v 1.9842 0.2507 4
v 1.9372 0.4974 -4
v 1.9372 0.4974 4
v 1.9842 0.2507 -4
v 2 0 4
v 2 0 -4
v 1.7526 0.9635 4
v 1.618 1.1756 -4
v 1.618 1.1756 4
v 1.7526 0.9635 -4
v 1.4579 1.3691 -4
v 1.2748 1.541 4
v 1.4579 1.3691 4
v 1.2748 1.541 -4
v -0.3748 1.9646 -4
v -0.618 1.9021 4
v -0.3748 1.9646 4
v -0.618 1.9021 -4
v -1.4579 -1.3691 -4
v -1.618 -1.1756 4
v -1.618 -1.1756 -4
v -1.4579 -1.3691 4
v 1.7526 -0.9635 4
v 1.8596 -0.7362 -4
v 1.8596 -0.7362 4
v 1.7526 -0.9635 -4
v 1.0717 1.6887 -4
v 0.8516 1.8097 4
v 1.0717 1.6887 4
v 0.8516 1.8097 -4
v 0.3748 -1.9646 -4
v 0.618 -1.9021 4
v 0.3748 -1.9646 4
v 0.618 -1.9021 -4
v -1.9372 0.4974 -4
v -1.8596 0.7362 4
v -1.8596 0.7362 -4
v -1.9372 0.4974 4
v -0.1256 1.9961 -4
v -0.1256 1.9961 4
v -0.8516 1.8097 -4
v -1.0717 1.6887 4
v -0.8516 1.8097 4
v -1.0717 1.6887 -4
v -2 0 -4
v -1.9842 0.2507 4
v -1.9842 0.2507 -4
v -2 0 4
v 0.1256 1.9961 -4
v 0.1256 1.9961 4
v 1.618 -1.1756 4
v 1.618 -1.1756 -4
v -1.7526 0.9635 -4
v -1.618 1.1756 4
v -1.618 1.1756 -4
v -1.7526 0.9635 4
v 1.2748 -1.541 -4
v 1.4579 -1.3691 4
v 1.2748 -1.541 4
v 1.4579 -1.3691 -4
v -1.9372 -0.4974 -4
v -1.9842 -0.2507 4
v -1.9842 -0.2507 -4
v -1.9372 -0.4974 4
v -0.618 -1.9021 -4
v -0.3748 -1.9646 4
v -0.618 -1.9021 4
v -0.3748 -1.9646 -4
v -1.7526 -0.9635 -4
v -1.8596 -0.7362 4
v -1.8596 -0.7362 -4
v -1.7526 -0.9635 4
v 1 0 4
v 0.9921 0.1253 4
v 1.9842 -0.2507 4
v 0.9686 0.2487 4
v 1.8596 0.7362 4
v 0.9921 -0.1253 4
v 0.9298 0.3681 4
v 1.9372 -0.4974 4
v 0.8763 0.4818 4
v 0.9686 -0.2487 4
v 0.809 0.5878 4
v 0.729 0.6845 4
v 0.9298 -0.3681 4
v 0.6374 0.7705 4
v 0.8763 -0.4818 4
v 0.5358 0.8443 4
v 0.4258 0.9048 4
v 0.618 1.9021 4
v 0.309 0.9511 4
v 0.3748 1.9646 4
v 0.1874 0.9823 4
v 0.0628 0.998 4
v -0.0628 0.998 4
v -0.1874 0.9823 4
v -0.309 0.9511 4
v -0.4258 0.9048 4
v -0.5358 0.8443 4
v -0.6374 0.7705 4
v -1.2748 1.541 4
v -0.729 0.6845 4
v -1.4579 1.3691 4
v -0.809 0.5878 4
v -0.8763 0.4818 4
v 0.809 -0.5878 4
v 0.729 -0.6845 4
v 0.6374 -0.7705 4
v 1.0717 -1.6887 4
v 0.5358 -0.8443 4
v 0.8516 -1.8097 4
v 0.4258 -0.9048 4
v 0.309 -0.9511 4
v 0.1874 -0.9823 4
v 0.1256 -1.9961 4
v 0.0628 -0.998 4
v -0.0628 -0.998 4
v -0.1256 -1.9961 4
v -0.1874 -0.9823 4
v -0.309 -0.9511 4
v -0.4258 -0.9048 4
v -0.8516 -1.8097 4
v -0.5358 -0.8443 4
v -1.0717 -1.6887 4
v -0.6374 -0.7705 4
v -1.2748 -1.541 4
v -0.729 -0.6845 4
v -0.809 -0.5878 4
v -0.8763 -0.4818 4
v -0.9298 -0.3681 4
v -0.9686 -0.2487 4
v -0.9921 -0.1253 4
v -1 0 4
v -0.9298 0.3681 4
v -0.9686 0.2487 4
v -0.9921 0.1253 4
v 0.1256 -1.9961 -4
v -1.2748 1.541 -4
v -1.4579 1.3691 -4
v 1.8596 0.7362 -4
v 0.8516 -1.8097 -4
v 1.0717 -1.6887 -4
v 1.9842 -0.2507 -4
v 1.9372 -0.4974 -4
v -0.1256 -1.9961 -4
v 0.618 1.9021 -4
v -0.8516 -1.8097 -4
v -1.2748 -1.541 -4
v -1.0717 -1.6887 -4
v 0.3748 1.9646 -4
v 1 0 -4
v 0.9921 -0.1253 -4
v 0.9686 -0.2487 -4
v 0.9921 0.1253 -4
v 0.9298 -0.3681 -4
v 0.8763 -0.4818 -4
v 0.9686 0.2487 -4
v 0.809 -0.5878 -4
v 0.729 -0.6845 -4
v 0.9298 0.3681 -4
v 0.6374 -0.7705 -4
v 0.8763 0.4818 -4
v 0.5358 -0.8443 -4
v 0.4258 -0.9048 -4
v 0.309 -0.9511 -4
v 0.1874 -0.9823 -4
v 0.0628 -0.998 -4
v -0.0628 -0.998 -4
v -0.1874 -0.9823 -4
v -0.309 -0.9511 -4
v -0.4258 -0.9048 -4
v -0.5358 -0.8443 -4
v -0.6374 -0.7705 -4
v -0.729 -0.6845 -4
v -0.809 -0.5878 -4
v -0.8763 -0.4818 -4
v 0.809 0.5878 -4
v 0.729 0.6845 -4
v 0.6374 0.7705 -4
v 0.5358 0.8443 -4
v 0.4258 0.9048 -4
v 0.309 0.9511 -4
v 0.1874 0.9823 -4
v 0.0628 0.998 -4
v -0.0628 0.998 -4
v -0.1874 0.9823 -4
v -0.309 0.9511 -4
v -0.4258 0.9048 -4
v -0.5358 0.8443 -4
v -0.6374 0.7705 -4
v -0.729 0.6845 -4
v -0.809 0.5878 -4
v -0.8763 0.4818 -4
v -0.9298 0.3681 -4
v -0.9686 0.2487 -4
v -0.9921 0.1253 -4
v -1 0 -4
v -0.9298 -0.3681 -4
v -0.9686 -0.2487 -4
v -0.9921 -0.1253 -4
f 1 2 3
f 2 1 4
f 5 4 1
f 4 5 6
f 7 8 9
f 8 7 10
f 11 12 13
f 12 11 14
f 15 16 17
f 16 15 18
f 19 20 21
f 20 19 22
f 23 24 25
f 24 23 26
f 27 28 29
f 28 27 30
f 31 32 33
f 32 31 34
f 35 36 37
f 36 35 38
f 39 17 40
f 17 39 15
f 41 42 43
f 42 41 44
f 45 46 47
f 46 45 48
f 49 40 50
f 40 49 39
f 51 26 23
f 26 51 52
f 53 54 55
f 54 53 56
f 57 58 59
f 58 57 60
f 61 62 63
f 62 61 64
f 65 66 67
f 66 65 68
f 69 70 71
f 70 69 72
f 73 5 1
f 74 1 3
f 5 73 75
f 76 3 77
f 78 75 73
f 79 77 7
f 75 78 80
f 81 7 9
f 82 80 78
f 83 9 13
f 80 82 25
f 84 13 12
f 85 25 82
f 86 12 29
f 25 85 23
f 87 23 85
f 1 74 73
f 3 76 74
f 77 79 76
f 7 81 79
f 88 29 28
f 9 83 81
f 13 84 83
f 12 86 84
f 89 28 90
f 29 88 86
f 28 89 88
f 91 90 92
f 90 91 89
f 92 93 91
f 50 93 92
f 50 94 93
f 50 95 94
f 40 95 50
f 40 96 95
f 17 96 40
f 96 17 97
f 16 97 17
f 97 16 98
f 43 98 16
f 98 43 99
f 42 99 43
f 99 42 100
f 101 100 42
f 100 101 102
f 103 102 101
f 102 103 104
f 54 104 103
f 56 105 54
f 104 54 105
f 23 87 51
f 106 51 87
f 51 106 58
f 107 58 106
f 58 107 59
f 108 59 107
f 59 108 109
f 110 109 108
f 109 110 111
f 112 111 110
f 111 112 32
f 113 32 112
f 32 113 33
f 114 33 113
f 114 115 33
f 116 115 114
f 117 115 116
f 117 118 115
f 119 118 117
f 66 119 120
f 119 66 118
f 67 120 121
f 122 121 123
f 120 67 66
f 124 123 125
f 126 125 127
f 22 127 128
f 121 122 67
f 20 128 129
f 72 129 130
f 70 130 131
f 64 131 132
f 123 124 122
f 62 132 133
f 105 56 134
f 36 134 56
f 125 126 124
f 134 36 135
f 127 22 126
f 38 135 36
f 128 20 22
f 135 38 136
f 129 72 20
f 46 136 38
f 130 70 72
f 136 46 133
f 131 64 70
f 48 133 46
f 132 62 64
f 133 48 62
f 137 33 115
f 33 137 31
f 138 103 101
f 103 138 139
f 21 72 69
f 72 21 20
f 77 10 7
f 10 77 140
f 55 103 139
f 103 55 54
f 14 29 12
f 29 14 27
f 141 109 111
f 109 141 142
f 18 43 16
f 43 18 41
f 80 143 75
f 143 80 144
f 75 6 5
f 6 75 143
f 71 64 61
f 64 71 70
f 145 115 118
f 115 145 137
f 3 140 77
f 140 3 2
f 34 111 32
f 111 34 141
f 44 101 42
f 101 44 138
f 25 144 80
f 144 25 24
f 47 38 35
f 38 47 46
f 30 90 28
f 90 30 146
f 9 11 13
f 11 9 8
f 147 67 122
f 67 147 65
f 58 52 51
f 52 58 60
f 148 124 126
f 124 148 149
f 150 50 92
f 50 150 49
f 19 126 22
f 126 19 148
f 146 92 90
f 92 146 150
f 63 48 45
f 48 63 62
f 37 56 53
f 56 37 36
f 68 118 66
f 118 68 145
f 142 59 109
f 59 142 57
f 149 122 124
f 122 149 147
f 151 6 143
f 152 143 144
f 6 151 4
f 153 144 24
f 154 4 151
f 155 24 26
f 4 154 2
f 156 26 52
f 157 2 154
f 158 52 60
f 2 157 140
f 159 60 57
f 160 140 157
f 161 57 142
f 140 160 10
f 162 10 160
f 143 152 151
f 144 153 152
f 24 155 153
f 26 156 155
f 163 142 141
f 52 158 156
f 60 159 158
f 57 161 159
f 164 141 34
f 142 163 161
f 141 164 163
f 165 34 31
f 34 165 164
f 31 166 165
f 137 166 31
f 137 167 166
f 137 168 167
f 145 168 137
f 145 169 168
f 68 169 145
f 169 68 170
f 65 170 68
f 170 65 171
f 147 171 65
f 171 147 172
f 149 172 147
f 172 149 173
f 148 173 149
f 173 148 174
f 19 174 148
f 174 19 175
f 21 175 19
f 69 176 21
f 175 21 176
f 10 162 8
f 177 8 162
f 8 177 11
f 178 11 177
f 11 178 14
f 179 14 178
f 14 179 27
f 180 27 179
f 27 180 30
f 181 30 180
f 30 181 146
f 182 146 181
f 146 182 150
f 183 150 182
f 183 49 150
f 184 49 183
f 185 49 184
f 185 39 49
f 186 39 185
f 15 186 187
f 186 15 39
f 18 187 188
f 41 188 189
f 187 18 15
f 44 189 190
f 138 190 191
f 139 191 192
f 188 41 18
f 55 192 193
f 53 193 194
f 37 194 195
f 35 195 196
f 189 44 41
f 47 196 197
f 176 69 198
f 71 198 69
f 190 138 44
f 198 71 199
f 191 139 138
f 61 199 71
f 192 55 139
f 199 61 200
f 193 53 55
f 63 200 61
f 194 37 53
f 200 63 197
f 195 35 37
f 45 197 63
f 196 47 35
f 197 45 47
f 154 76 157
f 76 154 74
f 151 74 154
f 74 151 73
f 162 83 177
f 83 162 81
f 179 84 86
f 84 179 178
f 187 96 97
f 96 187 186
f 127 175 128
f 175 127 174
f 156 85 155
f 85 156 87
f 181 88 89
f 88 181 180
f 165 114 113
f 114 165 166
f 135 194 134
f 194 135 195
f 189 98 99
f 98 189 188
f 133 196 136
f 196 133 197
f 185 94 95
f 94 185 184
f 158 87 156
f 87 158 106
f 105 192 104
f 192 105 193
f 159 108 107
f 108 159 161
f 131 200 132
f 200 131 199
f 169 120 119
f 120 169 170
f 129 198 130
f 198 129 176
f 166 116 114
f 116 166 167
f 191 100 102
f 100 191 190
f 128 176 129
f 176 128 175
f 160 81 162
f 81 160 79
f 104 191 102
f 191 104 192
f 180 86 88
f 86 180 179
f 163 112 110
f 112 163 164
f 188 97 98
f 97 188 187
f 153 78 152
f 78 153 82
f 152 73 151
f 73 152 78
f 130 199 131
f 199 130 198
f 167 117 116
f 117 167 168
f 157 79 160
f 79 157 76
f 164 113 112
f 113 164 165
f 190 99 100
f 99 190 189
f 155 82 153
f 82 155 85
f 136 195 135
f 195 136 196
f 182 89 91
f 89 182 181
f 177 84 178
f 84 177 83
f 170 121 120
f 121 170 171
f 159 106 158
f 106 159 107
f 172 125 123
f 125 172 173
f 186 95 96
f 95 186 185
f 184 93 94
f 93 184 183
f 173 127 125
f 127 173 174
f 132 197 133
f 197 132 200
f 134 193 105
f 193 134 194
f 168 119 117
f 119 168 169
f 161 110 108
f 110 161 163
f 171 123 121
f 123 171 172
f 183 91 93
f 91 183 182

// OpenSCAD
$fn = 50;


difference() {
	union() {
		translate(v = [0, 0, -4.0000000000]) {
			cylinder(h = 8, r = 2.0000000000);
		}
	}
	union() {
		translate(v = [0, 0, -100.0000000000]) {
			cylinder(h = 200, r = 1.0000000000);
		}
	}
}
